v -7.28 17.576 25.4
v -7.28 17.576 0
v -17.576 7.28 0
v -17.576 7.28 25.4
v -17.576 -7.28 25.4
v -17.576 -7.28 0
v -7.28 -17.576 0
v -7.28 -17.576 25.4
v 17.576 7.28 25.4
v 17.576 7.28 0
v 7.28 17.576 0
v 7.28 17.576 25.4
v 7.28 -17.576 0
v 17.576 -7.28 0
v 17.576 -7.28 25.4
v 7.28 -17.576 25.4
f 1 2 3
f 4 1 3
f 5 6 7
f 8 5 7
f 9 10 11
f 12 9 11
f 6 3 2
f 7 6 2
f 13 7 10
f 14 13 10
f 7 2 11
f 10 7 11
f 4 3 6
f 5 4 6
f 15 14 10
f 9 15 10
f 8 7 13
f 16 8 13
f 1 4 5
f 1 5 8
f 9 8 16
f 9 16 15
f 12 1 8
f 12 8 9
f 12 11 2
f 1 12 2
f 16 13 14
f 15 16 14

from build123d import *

# Parameters (mm, degrees)
F1_DEPTH = 25.4
F3_DEPTH = 25.4


with BuildPart() as f1:
    # F0 (on Top) → F1 (new body)
    with BuildSketch(Plane.XY):
        Polygon((17.57632, -7.28035), (17.57632, 7.28035), (7.28035, 17.57632), (-7.28035, 17.57632), (-17.57632, 7.28035), (-17.57632, -7.28035), (-7.28035, -17.57632), (7.28035, -17.57632), align=None)
    extrude(amount=F1_DEPTH)

    # F2 (on Top) → F3 (join)
    with BuildSketch(Plane.XY):
        Polygon((14.142192, -0.699994), (9.36479, 10.620372), (-2.46449, 13.943381), (-12.437959, 6.76674), (-13.045391, -5.505394), (-3.829378, -13.631854), (8.270235, -11.49325), align=None)
    extrude(amount=F3_DEPTH)


solid = f1.part
